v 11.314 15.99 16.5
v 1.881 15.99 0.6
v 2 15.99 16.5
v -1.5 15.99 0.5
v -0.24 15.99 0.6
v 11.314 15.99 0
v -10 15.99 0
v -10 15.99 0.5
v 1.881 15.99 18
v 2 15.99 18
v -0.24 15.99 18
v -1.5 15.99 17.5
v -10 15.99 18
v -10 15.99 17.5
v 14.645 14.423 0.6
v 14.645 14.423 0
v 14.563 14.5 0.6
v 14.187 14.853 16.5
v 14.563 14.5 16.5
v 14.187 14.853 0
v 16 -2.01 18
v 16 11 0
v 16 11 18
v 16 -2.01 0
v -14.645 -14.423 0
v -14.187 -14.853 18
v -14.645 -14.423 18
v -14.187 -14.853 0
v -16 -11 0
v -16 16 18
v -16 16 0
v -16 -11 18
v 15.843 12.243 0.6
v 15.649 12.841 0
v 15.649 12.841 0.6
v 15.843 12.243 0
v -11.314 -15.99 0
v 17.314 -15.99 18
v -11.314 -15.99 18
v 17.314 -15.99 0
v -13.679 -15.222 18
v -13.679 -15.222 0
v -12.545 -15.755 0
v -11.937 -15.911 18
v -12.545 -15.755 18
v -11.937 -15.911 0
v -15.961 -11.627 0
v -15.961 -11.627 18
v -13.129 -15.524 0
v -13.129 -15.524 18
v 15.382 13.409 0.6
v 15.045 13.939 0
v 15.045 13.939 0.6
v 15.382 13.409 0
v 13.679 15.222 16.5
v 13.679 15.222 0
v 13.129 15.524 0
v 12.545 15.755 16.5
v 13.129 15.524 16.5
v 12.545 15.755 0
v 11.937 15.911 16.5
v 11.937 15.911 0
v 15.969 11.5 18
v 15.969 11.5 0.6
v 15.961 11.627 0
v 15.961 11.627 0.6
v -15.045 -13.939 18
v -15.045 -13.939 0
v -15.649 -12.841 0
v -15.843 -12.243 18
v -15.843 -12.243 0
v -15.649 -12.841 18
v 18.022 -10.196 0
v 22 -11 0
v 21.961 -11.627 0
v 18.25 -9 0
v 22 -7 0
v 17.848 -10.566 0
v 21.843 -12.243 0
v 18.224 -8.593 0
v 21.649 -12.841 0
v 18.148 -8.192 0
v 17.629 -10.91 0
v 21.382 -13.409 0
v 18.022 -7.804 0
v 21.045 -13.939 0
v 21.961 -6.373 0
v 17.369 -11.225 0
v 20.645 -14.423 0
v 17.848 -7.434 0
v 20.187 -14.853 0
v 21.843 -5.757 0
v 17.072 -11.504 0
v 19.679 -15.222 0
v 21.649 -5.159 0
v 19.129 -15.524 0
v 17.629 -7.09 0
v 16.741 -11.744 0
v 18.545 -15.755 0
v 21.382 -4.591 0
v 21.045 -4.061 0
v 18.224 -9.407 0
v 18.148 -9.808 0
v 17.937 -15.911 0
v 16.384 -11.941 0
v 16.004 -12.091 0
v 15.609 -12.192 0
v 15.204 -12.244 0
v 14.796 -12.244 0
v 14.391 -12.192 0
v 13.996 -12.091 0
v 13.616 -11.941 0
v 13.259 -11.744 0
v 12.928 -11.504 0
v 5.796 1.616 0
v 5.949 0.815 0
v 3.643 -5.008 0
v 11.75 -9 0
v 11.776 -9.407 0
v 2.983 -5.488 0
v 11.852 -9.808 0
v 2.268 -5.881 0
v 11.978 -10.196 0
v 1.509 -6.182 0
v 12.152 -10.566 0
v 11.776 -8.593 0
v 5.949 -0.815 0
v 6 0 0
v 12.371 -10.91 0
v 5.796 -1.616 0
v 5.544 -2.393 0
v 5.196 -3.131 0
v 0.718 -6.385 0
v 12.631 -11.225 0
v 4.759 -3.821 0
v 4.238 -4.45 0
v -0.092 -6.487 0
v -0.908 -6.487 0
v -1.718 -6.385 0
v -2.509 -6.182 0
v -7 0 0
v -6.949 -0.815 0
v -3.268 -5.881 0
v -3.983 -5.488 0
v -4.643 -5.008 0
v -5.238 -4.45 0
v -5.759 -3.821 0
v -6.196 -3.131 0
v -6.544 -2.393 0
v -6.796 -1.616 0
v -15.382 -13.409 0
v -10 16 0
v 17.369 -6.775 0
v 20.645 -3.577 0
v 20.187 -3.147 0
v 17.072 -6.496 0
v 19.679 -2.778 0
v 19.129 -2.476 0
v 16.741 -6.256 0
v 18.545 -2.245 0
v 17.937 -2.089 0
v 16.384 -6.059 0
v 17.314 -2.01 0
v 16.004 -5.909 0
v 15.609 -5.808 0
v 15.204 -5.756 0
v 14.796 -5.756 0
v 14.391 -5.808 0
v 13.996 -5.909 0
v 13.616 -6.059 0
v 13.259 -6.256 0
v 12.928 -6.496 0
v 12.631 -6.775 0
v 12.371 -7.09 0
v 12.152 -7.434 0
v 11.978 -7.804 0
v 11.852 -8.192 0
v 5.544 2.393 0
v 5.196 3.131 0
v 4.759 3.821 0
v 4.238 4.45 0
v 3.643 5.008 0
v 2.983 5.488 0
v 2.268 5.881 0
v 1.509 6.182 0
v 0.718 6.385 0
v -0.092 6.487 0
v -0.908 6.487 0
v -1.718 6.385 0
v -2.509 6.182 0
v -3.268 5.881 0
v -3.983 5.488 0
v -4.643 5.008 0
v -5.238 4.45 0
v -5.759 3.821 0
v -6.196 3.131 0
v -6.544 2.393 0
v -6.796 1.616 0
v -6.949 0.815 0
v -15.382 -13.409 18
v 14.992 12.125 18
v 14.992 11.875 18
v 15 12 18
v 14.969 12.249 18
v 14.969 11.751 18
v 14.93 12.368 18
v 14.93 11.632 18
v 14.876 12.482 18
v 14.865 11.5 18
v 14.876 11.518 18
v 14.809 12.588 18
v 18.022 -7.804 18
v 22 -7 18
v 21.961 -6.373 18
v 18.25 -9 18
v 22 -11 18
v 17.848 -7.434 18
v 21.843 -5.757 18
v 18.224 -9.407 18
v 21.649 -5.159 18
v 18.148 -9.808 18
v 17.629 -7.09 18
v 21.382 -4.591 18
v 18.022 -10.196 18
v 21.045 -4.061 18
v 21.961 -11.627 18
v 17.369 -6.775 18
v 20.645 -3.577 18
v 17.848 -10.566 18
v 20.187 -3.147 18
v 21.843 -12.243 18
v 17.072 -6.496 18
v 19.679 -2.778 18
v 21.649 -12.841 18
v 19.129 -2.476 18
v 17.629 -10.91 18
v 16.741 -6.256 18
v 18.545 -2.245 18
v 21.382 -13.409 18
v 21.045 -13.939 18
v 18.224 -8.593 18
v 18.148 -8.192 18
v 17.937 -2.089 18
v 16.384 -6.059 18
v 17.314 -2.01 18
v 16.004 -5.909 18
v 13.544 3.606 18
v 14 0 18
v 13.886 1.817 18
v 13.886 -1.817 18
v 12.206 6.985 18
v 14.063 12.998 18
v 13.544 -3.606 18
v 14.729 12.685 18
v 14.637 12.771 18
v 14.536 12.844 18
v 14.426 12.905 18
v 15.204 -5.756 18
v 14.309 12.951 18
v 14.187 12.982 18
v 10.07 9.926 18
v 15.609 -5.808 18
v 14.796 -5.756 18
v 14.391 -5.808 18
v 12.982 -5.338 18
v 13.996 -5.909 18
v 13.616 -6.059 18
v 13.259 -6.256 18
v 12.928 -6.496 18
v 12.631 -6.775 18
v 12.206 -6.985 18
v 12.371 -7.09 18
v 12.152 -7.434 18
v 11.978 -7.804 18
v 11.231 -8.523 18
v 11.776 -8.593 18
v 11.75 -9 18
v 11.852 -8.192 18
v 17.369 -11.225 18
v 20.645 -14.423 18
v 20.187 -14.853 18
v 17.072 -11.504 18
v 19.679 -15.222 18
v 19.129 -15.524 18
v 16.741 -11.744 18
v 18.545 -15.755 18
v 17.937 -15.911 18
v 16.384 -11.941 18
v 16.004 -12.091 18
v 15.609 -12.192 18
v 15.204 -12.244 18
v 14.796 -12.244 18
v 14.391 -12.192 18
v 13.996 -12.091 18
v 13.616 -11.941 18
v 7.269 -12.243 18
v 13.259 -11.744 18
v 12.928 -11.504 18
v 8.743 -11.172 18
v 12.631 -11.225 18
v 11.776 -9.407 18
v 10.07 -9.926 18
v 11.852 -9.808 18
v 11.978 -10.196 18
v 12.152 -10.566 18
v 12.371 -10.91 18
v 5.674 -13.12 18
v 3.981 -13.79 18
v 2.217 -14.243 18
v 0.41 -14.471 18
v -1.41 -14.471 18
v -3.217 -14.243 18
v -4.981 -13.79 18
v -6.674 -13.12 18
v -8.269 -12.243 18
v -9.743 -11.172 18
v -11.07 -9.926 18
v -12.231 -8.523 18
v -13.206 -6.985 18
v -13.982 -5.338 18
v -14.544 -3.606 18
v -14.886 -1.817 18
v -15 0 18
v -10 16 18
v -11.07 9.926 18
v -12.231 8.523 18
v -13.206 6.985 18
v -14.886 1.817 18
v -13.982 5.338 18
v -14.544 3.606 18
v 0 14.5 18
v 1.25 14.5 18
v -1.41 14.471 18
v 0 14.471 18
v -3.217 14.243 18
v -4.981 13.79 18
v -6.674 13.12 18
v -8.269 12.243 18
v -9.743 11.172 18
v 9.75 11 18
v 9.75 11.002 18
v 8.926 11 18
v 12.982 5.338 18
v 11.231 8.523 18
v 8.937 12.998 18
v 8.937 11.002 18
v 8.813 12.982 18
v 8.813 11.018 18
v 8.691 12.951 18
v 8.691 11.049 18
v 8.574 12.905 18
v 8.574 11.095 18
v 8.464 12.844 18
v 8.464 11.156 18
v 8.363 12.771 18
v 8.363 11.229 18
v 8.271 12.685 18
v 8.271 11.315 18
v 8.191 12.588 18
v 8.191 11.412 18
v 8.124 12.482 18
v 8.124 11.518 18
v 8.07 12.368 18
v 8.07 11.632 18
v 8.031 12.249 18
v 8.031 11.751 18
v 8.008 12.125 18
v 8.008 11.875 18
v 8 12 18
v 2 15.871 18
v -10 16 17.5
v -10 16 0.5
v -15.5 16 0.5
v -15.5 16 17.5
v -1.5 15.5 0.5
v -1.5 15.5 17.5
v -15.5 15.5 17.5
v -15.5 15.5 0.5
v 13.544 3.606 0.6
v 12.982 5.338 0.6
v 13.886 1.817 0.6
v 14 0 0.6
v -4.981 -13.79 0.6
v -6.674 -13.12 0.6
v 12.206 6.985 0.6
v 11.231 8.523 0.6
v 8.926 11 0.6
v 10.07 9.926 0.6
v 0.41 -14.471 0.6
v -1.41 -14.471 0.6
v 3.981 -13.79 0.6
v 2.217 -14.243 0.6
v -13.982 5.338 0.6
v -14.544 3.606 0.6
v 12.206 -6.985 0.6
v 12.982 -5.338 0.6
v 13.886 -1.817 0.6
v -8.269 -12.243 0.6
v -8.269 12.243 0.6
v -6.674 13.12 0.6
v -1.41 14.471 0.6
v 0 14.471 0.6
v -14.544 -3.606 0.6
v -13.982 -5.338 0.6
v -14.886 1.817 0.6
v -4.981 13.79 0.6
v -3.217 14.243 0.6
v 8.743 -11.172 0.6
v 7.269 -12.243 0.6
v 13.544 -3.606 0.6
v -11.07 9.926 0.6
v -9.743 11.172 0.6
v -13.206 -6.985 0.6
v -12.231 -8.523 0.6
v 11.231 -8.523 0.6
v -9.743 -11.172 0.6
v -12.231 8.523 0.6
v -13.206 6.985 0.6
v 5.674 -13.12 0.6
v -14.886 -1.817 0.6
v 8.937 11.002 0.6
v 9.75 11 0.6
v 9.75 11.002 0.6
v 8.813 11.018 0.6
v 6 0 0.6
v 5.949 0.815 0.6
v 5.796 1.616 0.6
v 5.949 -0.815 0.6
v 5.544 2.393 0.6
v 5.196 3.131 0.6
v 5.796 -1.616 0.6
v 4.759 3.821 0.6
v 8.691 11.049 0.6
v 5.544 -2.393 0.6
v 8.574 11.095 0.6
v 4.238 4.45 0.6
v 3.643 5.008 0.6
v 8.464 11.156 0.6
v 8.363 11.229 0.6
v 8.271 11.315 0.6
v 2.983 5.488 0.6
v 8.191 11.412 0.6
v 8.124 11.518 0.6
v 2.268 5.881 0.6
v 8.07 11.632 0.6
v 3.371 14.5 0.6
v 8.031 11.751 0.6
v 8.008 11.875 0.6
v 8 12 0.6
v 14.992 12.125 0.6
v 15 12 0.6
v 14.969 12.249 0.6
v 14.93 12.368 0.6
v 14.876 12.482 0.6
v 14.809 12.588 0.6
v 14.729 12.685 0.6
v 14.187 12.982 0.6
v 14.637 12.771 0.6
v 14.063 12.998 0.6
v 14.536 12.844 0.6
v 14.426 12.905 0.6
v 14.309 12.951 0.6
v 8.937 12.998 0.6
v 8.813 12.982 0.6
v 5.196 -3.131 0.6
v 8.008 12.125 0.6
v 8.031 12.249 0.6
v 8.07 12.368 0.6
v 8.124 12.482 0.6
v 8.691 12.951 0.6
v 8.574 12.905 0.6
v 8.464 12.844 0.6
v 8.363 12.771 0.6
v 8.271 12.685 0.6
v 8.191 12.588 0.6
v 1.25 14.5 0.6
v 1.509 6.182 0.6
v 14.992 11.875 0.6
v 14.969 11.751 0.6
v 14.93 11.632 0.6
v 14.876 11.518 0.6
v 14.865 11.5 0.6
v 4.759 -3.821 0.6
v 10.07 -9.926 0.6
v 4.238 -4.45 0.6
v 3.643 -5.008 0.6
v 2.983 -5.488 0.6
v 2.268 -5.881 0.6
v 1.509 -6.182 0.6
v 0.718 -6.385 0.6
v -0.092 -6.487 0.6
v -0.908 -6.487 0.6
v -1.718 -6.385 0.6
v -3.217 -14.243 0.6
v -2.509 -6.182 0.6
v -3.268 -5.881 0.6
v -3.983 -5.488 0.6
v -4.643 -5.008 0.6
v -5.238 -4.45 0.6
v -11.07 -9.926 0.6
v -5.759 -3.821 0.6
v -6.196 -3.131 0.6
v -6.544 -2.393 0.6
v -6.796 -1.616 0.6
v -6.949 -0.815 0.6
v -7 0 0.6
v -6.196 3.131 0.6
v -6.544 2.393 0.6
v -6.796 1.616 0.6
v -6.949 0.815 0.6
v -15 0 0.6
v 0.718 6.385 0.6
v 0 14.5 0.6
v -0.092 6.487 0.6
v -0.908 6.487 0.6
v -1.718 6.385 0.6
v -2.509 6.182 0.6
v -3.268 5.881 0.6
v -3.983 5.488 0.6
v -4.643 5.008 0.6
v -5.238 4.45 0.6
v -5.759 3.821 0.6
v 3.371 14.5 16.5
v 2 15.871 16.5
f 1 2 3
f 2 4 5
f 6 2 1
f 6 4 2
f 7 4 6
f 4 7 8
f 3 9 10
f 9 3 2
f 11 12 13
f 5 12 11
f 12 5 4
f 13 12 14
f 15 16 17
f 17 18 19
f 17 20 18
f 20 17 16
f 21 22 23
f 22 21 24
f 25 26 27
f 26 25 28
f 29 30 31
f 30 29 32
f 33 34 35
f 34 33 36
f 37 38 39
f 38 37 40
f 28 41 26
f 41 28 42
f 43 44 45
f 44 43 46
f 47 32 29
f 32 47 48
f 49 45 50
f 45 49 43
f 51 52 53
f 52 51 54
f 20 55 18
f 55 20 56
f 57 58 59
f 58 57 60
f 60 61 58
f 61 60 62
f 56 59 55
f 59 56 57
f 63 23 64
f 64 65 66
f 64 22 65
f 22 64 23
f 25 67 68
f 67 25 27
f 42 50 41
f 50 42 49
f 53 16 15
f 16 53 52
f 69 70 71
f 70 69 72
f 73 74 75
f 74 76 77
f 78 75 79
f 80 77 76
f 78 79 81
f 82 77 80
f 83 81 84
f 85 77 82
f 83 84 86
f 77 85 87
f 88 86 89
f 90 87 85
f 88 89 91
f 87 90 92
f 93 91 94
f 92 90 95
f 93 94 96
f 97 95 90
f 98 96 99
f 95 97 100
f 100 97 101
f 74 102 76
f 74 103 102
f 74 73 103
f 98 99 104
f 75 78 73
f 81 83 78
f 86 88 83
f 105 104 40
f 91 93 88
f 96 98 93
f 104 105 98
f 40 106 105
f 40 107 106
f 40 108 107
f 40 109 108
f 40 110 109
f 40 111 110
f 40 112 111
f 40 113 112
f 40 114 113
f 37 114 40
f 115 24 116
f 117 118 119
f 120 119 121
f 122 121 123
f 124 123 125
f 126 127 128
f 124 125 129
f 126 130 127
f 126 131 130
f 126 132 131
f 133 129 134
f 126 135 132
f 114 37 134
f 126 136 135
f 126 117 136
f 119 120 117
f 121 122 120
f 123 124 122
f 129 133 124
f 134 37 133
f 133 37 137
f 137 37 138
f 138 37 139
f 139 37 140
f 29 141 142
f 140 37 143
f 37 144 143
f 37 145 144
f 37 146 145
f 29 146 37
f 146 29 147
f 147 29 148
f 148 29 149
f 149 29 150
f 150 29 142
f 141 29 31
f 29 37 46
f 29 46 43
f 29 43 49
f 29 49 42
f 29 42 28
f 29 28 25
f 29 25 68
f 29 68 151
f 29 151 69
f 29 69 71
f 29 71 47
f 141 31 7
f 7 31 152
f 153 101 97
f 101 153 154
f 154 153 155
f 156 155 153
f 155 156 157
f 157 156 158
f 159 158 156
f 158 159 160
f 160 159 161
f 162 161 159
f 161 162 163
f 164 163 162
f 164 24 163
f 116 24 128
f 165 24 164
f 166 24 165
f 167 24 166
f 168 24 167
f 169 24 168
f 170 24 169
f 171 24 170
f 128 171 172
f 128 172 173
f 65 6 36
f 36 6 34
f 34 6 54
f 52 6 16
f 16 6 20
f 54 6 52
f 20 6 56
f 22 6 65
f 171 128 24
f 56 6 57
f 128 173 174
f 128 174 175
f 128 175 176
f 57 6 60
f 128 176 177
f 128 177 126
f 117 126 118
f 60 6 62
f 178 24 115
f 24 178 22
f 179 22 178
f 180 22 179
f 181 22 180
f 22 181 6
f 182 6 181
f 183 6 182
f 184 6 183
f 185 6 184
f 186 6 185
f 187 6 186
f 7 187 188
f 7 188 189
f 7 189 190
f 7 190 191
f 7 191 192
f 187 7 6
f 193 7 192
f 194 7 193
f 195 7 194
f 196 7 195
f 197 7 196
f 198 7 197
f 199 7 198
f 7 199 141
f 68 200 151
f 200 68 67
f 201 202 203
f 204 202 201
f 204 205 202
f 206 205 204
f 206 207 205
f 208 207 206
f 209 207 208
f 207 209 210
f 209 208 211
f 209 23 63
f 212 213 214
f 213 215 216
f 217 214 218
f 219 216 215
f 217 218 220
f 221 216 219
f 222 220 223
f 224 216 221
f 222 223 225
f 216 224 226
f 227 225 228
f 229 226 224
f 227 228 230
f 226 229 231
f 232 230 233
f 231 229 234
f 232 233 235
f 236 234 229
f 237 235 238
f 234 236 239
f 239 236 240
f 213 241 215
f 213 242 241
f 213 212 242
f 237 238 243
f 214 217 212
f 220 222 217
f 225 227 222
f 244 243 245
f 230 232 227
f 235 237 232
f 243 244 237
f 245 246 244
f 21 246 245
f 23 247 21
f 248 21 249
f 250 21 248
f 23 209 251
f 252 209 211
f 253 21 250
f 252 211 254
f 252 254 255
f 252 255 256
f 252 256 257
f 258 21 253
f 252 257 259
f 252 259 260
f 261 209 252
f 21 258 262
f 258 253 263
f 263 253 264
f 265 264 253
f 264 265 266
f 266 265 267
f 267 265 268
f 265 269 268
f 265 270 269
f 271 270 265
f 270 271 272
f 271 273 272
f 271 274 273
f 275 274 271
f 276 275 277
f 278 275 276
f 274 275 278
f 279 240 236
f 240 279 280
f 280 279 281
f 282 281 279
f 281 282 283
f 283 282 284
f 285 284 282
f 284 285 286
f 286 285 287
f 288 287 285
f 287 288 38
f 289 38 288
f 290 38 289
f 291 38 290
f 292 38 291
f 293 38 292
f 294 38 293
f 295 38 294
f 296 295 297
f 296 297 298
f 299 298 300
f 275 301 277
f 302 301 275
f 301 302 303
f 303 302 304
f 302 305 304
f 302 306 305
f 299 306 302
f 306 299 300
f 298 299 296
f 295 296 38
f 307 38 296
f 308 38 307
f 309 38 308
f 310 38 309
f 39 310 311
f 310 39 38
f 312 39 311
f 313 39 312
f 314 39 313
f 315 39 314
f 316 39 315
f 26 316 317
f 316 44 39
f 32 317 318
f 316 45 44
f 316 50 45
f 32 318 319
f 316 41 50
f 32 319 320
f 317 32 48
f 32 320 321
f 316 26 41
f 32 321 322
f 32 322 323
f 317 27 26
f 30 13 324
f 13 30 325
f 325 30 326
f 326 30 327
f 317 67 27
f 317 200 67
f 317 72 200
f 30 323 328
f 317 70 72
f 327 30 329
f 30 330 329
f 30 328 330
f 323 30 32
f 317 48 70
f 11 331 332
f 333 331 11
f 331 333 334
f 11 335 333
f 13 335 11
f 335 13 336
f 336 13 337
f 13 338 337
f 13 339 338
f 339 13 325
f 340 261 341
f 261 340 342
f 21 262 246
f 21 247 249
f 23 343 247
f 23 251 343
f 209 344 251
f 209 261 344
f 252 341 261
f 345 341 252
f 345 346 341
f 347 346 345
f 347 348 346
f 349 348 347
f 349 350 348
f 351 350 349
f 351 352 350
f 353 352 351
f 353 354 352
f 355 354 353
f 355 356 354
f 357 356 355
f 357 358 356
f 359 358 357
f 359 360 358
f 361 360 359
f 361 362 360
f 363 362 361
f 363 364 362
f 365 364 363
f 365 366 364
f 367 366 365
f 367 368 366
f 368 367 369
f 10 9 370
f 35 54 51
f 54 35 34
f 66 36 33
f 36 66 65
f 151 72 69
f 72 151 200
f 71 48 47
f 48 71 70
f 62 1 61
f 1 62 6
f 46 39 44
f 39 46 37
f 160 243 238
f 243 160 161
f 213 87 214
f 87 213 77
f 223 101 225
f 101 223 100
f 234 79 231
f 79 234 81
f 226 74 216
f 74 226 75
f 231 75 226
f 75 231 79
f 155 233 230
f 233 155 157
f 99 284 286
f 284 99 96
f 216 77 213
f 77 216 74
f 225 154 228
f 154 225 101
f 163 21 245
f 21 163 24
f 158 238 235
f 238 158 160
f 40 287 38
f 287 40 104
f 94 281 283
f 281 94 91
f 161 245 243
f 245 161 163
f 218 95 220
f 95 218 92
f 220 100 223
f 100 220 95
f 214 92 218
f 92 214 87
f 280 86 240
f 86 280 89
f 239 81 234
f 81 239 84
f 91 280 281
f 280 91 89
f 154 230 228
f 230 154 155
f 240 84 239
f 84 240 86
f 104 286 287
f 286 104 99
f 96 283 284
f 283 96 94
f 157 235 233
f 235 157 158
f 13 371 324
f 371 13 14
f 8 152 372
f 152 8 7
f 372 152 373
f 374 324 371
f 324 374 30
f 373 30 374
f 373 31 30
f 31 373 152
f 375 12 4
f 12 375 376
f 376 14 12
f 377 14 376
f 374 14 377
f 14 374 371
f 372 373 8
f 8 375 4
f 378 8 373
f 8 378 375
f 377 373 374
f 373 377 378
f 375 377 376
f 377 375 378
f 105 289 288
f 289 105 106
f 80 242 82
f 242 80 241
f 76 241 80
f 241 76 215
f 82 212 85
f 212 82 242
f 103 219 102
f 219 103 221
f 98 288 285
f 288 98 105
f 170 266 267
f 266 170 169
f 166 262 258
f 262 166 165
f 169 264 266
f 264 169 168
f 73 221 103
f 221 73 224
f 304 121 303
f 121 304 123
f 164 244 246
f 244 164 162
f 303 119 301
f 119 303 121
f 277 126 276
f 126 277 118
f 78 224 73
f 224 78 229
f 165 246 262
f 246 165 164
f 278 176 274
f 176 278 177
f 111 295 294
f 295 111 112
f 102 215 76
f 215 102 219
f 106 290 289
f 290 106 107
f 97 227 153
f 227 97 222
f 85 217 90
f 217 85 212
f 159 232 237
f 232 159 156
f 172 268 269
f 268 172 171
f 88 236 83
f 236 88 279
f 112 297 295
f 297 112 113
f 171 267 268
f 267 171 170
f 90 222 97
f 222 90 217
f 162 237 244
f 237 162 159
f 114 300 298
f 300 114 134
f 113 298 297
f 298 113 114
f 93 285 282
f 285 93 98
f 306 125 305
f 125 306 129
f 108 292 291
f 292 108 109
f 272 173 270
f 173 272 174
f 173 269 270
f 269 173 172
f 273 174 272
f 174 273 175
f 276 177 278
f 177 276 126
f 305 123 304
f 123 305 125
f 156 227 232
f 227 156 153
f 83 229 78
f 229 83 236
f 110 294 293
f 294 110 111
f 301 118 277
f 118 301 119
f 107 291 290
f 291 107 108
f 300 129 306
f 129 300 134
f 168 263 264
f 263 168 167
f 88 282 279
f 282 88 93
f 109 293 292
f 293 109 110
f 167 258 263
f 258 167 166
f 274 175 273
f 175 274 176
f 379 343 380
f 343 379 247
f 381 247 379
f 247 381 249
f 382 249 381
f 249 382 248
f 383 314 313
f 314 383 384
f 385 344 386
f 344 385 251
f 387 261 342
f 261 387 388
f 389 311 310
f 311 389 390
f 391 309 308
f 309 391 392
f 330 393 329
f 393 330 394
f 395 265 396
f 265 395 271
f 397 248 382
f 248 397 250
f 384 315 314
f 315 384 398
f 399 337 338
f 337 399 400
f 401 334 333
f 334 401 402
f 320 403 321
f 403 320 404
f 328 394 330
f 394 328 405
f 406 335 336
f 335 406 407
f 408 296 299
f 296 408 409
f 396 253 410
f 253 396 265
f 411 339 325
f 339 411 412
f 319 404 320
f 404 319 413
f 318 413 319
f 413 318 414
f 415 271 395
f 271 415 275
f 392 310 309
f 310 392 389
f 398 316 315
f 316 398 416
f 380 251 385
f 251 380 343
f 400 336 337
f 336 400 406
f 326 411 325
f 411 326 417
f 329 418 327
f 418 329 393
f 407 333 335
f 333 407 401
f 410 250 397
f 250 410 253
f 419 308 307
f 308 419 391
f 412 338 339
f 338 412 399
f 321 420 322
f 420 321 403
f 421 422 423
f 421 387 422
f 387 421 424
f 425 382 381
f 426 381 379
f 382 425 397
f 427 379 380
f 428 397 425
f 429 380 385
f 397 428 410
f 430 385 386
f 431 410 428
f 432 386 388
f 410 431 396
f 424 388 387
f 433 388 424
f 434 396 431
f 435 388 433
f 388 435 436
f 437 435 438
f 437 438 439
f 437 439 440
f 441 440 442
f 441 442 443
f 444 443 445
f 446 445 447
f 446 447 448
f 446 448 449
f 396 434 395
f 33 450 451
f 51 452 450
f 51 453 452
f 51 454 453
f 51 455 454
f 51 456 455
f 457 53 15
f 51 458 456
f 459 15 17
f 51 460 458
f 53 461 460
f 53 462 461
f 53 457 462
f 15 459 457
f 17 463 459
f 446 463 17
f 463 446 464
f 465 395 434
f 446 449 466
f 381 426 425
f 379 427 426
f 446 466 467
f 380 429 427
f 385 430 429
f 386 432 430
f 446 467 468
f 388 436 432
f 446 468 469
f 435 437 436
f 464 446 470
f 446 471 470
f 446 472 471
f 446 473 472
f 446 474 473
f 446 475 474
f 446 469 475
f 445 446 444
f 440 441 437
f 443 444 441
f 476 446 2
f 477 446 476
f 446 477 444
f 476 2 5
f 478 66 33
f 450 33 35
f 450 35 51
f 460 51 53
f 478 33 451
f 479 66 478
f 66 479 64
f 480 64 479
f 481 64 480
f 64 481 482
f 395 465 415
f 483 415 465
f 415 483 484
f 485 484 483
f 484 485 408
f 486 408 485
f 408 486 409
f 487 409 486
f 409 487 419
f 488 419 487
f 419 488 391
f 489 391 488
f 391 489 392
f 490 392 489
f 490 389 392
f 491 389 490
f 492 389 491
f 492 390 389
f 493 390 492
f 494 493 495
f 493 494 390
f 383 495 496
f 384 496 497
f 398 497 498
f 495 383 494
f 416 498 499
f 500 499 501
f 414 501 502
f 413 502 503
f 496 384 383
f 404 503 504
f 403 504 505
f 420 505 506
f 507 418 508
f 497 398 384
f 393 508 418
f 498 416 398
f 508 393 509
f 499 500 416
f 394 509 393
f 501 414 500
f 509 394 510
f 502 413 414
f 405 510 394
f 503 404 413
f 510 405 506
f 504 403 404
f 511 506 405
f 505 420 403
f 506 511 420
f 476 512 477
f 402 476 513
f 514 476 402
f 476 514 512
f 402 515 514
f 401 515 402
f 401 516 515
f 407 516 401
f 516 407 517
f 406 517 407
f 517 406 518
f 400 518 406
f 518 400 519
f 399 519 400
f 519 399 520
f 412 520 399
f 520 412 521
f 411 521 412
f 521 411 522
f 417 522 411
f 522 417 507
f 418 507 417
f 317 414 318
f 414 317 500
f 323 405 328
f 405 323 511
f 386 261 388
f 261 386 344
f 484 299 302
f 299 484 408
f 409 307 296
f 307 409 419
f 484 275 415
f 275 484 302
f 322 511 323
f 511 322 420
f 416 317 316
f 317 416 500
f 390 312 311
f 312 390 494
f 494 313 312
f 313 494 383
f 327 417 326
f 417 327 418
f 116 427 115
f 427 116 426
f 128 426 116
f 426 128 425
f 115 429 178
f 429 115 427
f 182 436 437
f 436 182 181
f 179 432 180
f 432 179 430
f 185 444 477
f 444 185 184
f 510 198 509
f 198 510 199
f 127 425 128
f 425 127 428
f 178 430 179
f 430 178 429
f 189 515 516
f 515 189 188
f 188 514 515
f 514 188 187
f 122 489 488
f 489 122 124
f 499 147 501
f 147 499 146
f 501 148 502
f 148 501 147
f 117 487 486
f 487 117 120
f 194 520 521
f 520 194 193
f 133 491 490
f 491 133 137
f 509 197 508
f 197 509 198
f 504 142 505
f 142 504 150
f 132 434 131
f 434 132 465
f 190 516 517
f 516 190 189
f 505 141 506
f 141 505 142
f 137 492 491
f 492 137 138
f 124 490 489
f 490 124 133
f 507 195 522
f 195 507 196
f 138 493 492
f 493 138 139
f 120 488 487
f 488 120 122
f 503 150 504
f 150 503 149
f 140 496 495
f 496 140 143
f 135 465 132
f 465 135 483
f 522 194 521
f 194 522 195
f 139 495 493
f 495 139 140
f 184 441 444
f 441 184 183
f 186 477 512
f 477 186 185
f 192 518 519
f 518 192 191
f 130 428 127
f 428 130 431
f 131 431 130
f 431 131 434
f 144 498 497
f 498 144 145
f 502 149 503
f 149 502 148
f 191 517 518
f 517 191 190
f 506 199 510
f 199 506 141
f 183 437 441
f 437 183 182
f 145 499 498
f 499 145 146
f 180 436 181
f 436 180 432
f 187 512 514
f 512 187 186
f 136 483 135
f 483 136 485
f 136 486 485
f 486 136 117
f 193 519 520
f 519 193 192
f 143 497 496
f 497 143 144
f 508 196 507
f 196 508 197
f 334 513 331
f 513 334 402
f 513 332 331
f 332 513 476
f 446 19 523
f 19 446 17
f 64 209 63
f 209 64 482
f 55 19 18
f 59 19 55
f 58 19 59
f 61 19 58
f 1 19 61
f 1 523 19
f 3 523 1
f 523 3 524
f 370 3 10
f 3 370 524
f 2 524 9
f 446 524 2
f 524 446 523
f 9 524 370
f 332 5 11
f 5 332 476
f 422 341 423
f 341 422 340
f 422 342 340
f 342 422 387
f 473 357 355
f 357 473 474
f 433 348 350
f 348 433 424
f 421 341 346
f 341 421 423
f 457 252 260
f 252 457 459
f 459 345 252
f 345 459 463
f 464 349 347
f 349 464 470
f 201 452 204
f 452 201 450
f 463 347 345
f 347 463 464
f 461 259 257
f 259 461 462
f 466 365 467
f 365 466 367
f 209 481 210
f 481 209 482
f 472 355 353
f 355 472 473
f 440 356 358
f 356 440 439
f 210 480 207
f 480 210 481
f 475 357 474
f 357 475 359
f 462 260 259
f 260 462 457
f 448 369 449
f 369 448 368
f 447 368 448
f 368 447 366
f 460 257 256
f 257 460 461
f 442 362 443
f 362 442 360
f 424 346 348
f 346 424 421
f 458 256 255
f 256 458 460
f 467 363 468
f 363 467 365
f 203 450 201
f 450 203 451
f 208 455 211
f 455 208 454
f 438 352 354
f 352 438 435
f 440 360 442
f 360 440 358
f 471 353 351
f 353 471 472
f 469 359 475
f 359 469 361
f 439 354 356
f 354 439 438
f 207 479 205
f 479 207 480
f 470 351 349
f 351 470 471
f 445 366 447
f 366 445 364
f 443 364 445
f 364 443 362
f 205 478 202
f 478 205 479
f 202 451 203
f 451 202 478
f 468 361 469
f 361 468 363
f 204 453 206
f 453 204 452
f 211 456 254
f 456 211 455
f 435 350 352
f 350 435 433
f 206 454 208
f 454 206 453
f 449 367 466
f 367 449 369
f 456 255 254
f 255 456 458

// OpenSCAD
$fn = 50;


union() {
	difference() {
		union() {
			translate(v = [0, 0, 0]) {
				rotate(a = [0, 0, 0]) {
					hull() {
						translate(v = [-11.0000000000, 11.0000000000, 0]) {
							rotate(a = [0, 0, 0]) {
								translate(v = [0, 0, 0]) {
									rotate(a = [0, 0, 0]) {
										cylinder(h = 18, r = 5);
									}
								}
							}
						}
						translate(v = [11.0000000000, 11.0000000000, 0]) {
							rotate(a = [0, 0, 0]) {
								translate(v = [0, 0, 0]) {
									rotate(a = [0, 0, 0]) {
										cylinder(h = 18, r = 5);
									}
								}
							}
						}
						translate(v = [-11.0000000000, -11.0000000000, 0]) {
							rotate(a = [0, 0, 0]) {
								translate(v = [0, 0, 0]) {
									rotate(a = [0, 0, 0]) {
										cylinder(h = 18, r = 5);
									}
								}
							}
						}
						translate(v = [11.0000000000, -11.0000000000, 0]) {
							rotate(a = [0, 0, 0]) {
								translate(v = [0, 0, 0]) {
									rotate(a = [0, 0, 0]) {
										cylinder(h = 18, r = 5);
									}
								}
							}
						}
					}
				}
			}
			translate(v = [7.5000000000, -9.0000000000, 0]) {
				rotate(a = [0, 0, 0]) {
					hull() {
						translate(v = [-9.5000000000, 2.0000000000, 0]) {
							rotate(a = [0, 0, 0]) {
								translate(v = [0, 0, 0]) {
									rotate(a = [0, 0, 0]) {
										cylinder(h = 18, r = 5);
									}
								}
							}
						}
						translate(v = [9.5000000000, 2.0000000000, 0]) {
							rotate(a = [0, 0, 0]) {
								translate(v = [0, 0, 0]) {
									rotate(a = [0, 0, 0]) {
										cylinder(h = 18, r = 5);
									}
								}
							}
						}
						translate(v = [-9.5000000000, -2.0000000000, 0]) {
							rotate(a = [0, 0, 0]) {
								translate(v = [0, 0, 0]) {
									rotate(a = [0, 0, 0]) {
										cylinder(h = 18, r = 5);
									}
								}
							}
						}
						translate(v = [9.5000000000, -2.0000000000, 0]) {
							rotate(a = [0, 0, 0]) {
								translate(v = [0, 0, 0]) {
									rotate(a = [0, 0, 0]) {
										cylinder(h = 18, r = 5);
									}
								}
							}
						}
					}
				}
			}
			translate(v = [-16.0000000000, 10.0000000000, 0]) {
				rotate(a = [0, 0, 0]) {
					cube(size = [6, 6, 18]);
				}
			}
		}
		union() {
			translate(v = [-15.5000000000, 15.5000000000, 0.5000000000]) {
				rotate(a = [0, 0, 0]) {
					cube(size = [14, 0.5000000000, 17.0000000000]);
				}
			}
			translate(v = [15.0000000000, -9.0000000000, -125.0000000000]) {
				rotate(a = [0, 0, 0]) {
					cylinder(h = 250, r = 3.2500000000);
				}
			}
			translate(v = [-0.5000000000, 0.0000000000, 0.6000000000]) {
				rotate(a = [0, 0, 0]) {
					cylinder(h = 20.4000000000, r = 14.5000000000);
				}
			}
			translate(v = [-0.5000000000, 0.0000000000, -9.0000000000]) {
				rotate(a = [0, 0, 0]) {
					cylinder(h = 18, r = 6.5000000000);
				}
			}
			translate(v = [0.0000000000, 11.5000000000, 0.6000000000]) {
				rotate(a = [0, 0, 0]) {
					cube(size = [16.0000000000, 3, 20.4000000000]);
				}
			}
			translate(v = [2.0000000000, 11.5000000000, 16.5000000000]) {
				rotate(a = [0, 0, 0]) {
					cube(size = [14.0000000000, 6, 1.5000000000]);
				}
			}
			translate(v = [-3.0000000000, 18.7500000000, 0.6000000000]) {
				rotate(a = [0, 0, -45]) {
					cube(size = [10, 1.5000000000, 20.4000000000]);
				}
			}
			translate(v = [2.2500000000, 11.0000000000, 0.6000000000]) {
				rotate(a = [0, 0, 0]) {
					cube(size = [7.5000000000, 2, 17.4000000000]);
				}
			}
		}
	}
	union() {
		translate(v = [11.5000000000, 12, 0]) {
			rotate(a = [0, 0, 0]) {
				hull() {
					translate(v = [2.5000000000, 0, 0]) {
						rotate(a = [0, 0, 0]) {
							translate(v = [0, 0, 0]) {
								rotate(a = [0, 0, 0]) {
									cylinder(h = 18, r = 1.0000000000);
								}
							}
						}
					}
					translate(v = [-2.5000000000, 0, 0]) {
						rotate(a = [0, 0, 0]) {
							translate(v = [0, 0, 0]) {
								rotate(a = [0, 0, 0]) {
									cylinder(h = 18, r = 1.0000000000);
								}
							}
						}
					}
				}
			}
		}
	}
}
